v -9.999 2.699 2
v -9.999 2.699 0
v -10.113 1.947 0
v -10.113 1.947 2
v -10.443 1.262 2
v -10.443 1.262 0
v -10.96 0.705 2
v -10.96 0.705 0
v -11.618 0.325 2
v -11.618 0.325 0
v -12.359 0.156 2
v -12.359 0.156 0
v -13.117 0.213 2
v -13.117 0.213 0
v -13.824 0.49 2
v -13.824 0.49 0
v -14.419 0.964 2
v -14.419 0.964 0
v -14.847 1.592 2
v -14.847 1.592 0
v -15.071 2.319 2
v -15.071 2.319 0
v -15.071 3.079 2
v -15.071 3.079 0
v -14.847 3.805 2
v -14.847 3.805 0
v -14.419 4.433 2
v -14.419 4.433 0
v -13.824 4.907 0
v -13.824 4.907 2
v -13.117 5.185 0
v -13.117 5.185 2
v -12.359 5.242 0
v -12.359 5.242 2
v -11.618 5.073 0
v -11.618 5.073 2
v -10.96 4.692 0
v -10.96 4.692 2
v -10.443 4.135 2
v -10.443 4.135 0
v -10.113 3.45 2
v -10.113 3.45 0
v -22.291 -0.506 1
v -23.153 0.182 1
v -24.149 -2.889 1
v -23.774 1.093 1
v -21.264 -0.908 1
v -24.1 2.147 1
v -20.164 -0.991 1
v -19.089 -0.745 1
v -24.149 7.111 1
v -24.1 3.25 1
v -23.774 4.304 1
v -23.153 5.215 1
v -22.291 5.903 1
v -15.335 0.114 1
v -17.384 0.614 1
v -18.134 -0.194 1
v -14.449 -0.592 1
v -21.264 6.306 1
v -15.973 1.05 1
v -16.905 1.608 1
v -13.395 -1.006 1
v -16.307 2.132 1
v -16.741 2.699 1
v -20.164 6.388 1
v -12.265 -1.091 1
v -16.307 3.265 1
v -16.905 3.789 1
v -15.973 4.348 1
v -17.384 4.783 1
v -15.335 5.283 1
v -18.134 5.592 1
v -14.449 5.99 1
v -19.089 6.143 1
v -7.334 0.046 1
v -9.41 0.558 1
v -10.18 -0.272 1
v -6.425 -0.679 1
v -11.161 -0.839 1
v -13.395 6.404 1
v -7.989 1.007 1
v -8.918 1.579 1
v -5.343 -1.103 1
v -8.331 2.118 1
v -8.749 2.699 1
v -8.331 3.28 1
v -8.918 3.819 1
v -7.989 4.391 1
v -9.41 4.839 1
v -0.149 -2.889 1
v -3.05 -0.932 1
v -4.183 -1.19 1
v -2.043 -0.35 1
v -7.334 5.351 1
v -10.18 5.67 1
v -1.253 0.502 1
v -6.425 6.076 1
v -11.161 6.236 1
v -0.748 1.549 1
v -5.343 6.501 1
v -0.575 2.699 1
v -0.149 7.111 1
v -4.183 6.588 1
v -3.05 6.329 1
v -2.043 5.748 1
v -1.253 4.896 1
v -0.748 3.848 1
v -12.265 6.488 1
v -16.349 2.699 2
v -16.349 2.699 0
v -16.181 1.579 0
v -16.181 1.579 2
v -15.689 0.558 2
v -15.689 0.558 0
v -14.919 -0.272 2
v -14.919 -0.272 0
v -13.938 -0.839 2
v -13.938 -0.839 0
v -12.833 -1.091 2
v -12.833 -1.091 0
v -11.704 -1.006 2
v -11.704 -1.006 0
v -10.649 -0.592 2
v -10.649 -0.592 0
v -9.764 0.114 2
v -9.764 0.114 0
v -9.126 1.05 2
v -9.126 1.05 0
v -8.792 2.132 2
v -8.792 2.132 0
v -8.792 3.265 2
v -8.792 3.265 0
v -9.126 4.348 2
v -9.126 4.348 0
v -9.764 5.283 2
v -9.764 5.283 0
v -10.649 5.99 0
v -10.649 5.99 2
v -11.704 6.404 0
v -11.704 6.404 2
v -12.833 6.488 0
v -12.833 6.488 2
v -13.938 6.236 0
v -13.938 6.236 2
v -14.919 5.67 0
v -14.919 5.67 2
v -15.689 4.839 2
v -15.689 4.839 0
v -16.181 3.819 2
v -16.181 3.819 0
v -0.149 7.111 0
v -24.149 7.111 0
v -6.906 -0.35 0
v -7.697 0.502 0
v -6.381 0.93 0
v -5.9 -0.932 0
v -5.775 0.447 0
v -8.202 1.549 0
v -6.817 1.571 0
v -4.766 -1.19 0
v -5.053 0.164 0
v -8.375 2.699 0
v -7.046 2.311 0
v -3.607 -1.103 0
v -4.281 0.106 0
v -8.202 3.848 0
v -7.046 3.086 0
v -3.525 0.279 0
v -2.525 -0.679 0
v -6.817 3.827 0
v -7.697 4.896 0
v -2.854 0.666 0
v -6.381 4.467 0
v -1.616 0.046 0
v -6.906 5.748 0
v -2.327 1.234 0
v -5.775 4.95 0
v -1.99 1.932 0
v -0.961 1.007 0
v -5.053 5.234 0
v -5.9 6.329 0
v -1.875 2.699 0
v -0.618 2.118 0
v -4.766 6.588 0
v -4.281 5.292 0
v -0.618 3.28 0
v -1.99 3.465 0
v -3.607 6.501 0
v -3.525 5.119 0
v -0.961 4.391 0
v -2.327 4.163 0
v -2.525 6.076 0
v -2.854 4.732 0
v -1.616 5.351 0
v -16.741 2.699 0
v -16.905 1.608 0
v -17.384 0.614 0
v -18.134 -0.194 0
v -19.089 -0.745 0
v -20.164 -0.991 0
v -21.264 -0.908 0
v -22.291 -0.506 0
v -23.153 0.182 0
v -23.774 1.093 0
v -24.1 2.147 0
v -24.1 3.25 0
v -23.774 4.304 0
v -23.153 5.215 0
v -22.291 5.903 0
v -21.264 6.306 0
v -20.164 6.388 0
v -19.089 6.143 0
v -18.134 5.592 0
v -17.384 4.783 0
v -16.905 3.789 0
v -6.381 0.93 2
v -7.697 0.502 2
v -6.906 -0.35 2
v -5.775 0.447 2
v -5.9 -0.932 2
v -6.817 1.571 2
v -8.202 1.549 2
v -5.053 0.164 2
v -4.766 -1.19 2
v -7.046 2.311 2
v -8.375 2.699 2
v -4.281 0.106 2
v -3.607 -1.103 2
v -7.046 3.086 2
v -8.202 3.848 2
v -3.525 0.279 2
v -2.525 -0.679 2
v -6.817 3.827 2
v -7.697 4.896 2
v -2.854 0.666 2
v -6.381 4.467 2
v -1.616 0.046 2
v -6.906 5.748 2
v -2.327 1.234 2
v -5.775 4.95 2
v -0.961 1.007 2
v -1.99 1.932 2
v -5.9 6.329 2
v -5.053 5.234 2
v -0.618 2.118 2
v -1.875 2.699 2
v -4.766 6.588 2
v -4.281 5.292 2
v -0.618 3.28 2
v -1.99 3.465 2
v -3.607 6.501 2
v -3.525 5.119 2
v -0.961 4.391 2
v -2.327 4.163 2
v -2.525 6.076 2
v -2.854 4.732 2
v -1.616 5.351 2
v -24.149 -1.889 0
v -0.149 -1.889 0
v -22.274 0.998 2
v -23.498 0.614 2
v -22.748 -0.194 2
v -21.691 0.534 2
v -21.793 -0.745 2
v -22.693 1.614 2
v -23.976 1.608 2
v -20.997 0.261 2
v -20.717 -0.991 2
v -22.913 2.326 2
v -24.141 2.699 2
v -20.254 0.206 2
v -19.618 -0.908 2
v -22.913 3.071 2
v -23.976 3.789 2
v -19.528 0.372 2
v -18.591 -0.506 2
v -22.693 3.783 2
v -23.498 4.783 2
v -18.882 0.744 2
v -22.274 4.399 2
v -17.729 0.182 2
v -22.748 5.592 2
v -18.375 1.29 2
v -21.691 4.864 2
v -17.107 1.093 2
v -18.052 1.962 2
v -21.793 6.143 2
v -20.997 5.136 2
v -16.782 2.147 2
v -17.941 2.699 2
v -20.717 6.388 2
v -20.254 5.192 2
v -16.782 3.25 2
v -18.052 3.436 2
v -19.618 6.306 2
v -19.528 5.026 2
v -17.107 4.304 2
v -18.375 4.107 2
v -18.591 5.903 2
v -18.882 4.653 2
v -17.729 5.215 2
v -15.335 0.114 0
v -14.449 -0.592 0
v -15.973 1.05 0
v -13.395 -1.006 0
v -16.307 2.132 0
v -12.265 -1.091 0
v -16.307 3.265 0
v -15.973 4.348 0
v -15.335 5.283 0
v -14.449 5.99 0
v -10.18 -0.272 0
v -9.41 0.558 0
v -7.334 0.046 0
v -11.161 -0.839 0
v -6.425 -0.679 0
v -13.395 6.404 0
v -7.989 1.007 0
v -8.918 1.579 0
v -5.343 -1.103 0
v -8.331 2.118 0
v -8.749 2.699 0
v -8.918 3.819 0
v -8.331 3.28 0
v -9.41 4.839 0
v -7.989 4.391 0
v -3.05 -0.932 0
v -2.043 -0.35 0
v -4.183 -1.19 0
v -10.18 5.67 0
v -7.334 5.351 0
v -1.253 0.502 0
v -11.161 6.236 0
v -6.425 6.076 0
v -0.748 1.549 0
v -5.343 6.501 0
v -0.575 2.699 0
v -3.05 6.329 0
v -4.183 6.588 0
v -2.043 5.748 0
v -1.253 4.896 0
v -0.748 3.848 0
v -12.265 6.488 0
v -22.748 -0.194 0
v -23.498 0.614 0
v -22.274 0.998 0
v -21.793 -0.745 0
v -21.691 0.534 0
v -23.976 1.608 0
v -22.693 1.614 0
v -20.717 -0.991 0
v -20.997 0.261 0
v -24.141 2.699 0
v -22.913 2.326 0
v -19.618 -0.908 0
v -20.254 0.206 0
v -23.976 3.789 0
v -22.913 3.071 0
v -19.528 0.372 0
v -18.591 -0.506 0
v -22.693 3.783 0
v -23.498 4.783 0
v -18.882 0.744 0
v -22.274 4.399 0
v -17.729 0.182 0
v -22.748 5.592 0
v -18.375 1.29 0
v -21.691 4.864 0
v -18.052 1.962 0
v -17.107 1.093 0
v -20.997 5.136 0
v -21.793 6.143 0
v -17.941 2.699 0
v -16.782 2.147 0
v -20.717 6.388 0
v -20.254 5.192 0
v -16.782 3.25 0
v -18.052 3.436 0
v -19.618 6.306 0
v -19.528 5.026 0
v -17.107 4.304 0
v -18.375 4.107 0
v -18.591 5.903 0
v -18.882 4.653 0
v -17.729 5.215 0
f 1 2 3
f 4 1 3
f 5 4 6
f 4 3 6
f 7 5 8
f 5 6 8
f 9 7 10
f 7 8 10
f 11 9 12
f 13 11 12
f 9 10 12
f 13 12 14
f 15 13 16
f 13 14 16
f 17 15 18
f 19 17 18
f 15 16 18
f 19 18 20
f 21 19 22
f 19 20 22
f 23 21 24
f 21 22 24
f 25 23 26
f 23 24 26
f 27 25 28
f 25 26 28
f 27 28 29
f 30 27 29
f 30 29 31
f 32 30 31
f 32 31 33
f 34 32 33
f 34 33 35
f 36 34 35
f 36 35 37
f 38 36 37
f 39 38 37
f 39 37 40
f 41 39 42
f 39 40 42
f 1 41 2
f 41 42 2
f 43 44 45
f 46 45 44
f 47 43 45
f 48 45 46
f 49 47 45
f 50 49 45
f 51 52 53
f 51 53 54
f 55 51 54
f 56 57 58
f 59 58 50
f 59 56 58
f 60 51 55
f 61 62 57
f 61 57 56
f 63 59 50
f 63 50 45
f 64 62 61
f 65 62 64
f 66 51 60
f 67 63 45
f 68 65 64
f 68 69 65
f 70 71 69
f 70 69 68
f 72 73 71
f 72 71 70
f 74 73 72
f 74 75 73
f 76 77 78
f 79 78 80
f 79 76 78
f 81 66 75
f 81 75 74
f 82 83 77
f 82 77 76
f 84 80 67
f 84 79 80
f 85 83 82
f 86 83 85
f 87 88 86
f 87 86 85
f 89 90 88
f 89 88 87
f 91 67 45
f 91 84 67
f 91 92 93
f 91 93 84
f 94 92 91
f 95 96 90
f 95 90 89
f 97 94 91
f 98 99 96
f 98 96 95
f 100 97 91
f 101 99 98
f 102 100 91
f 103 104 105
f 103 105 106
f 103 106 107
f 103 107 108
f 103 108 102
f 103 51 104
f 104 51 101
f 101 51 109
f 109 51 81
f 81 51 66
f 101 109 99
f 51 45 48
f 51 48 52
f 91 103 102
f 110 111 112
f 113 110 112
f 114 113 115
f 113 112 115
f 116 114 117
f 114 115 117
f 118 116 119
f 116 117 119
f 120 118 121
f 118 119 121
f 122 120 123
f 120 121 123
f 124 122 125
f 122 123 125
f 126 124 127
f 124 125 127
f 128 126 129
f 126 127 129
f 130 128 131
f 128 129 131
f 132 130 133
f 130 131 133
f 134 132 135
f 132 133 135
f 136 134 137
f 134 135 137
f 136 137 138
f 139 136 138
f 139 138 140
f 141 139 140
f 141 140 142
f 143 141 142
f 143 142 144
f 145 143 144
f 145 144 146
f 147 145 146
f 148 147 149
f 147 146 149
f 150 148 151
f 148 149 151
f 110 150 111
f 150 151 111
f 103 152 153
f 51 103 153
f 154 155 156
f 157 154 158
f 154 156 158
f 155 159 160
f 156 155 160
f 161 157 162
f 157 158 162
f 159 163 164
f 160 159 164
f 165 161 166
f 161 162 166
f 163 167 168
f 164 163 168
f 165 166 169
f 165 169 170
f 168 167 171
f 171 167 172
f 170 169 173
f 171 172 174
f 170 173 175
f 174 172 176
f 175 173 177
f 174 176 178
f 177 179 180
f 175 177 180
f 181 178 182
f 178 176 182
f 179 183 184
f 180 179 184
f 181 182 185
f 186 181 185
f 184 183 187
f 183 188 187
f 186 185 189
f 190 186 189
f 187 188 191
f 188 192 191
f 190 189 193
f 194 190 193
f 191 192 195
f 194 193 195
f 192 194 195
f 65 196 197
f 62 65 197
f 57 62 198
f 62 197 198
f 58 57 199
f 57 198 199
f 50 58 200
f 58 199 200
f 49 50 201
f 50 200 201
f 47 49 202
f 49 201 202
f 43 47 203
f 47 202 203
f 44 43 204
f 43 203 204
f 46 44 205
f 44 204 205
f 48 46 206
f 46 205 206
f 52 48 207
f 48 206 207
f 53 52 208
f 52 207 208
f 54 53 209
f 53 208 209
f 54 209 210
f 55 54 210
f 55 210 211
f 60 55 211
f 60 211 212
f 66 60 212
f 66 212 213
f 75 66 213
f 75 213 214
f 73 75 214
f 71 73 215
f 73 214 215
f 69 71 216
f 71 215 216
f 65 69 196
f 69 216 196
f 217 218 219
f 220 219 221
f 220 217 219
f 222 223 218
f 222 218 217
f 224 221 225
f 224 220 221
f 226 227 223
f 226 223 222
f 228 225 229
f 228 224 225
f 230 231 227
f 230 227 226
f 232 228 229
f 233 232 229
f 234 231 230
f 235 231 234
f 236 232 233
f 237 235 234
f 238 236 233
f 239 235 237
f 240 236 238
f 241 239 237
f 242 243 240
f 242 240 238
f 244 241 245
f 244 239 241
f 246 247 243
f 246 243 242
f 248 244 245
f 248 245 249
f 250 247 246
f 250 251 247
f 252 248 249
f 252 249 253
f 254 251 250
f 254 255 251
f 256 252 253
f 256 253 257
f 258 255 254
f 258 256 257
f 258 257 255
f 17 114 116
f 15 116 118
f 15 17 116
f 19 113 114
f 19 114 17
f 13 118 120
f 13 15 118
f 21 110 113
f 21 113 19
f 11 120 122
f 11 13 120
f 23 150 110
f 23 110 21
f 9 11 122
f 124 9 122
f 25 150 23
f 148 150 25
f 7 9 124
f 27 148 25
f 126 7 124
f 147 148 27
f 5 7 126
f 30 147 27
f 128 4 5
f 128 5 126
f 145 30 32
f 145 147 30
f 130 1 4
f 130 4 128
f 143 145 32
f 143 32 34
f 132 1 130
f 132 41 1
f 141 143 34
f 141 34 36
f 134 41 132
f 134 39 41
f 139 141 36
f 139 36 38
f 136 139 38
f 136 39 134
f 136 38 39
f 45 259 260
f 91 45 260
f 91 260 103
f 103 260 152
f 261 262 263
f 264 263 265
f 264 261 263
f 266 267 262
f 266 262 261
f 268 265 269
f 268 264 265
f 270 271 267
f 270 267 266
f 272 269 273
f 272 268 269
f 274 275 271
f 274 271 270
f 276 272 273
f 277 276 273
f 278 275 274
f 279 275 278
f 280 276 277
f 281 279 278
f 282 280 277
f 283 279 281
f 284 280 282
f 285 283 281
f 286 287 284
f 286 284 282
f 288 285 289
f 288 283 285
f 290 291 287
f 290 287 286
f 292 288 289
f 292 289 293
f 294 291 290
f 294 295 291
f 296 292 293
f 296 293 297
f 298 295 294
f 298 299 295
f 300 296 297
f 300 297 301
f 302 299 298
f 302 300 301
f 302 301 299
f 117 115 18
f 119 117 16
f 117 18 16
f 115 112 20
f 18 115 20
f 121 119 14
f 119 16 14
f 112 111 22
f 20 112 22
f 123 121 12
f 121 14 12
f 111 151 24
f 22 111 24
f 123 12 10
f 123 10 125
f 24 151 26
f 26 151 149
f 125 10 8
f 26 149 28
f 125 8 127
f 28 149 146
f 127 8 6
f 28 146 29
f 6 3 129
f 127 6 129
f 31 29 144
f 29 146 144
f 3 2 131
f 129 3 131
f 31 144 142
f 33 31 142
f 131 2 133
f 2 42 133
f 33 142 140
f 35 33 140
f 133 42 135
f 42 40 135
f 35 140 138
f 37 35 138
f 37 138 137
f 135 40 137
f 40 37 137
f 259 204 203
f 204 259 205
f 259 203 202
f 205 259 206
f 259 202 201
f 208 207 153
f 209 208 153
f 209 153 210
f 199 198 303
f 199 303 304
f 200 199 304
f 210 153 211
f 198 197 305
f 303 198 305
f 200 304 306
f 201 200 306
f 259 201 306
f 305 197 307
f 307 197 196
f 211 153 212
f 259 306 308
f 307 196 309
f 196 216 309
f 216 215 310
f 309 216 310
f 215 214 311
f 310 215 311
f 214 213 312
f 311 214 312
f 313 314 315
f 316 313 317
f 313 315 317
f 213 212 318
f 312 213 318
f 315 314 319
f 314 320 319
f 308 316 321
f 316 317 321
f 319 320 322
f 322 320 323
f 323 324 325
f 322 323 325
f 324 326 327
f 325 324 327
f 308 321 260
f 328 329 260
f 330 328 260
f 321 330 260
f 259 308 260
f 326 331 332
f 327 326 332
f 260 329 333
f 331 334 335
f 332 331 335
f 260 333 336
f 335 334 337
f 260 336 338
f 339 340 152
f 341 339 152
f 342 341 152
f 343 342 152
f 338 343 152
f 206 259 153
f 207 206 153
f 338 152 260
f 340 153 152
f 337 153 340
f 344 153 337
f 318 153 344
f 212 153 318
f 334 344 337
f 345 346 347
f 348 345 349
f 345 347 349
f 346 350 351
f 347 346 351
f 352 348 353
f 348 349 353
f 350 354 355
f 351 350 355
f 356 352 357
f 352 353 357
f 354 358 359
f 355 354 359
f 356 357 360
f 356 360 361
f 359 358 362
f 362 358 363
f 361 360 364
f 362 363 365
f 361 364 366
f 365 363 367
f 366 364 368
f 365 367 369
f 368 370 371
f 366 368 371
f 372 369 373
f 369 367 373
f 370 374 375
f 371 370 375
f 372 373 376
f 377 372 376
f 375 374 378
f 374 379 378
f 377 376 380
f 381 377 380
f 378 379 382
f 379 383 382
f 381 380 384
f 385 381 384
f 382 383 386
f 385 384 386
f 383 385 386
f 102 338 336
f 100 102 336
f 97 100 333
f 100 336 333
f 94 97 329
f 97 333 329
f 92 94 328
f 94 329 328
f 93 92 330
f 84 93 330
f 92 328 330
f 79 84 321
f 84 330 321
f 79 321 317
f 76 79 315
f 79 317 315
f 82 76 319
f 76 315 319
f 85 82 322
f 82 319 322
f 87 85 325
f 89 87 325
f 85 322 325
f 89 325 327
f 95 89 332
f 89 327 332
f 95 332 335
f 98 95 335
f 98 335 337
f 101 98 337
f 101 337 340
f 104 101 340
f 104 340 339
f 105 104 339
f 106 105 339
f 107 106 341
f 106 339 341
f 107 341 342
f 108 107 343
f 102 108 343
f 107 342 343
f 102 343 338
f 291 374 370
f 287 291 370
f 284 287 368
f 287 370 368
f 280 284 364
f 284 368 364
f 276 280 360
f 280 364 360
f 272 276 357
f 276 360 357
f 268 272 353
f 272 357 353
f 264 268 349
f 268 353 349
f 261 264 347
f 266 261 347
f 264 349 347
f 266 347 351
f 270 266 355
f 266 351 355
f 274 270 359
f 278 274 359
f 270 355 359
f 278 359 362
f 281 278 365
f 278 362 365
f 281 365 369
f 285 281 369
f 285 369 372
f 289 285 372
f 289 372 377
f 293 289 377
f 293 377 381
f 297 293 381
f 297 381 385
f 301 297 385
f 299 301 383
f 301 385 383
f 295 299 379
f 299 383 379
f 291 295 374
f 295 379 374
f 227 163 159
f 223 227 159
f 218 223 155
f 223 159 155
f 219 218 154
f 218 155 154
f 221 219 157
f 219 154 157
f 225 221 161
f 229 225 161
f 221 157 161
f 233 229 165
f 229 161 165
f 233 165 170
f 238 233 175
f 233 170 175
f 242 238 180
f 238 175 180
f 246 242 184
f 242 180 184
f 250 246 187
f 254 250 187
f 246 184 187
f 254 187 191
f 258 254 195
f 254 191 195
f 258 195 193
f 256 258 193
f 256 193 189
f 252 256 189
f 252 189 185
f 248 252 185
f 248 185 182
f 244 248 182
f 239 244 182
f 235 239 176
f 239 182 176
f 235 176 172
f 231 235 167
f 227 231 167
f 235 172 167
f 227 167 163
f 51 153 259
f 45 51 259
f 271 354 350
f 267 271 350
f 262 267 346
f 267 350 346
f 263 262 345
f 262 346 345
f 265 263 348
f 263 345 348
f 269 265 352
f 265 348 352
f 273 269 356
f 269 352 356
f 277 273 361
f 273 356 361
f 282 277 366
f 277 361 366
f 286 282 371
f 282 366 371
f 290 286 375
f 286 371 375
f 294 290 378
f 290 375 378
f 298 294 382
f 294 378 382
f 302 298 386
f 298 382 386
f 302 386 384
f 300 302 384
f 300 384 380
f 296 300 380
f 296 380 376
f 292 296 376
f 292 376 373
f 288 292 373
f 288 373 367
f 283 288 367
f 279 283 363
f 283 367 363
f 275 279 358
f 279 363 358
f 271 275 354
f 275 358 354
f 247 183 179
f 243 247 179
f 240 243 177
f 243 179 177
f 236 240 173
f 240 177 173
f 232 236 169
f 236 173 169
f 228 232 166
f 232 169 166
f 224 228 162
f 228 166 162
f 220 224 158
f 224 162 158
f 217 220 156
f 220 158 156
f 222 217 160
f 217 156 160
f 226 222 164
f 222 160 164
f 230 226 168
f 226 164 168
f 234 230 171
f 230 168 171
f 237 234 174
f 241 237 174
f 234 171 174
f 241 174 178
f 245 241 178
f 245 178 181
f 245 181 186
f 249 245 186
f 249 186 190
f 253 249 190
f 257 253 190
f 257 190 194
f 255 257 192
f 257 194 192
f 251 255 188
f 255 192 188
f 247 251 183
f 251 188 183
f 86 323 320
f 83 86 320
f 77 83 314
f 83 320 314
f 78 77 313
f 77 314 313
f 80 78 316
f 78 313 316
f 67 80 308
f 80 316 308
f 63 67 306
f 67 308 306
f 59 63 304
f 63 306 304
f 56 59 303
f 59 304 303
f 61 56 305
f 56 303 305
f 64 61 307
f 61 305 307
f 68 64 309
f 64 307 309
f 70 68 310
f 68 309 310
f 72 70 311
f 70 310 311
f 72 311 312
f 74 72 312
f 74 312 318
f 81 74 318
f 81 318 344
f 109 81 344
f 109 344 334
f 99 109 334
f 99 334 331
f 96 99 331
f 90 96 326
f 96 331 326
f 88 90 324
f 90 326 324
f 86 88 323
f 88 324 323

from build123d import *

# Parameters (mm, degrees)
F1_DEPTH = 2
F2_DEPTH = 1
F3_SIZE  = 0.99999


# Not quite as in the source:
# - a fillet or chamfer is up to 0.001 mm smaller than in the source, because OpenCascade refuses the exact size


with BuildPart() as f1:
    # F0 (on Top) → F1 (new body)
    with BuildSketch(Plane.XY):
        with BuildLine():
            ThreePointArc((-16.7408706831, 2.6987831955), (-20.4408706831, 6.3987831955), (-24.1408706831, 2.6987831955))
            Line((-24.1408706831, 2.6987831955), (-22.9408706831, 2.6987831955))
            ThreePointArc((-22.9408706831, 2.6987831955), (-20.4408706831, 5.1987831955), (-17.9408706831, 2.6987831955))
            Line((-17.9408706831, 2.6987831955), (-16.7408706831, 2.6987831955))
        make_face()
        with BuildLine():
            Line((-22.9408706831, 2.6987831955), (-24.1408706831, 2.6987831955))
            ThreePointArc((-24.1408706831, 2.6987831955), (-20.4408706831, -1.0012168045), (-16.7408706831, 2.6987831955))
            Line((-16.7408706831, 2.6987831955), (-17.9408706831, 2.6987831955))
            ThreePointArc((-17.9408706831, 2.6987831955), (-20.4408706831, 0.1987831955), (-22.9408706831, 2.6987831955))
        make_face()
    extrude(amount=F1_DEPTH)


with BuildPart() as f1b:
    # F0 (on Top) → F1, piece 2 (new body)
    with BuildSketch(Plane.XY):
        with BuildLine():
            ThreePointArc((-8.7494403885, 2.6987831955), (-12.5494403885, 6.4987831955), (-16.3494403885, 2.6987831955))
            Line((-16.3494403885, 2.6987831955), (-15.0994403885, 2.6987831955))
            ThreePointArc((-15.0994403885, 2.6987831955), (-12.5494403885, 5.2487831955), (-9.9994403885, 2.6987831955))
            Line((-9.9994403885, 2.6987831955), (-8.7494403885, 2.6987831955))
        make_face()
        with BuildLine():
            Line((-15.0994403885, 2.6987831955), (-16.3494403885, 2.6987831955))
            ThreePointArc((-16.3494403885, 2.6987831955), (-12.5494403885, -1.1012168045), (-8.7494403885, 2.6987831955))
            Line((-8.7494403885, 2.6987831955), (-9.9994403885, 2.6987831955))
            ThreePointArc((-9.9994403885, 2.6987831955), (-12.5494403885, 0.1487831955), (-15.0994403885, 2.6987831955))
        make_face()
    extrude(amount=F1_DEPTH)


with BuildPart() as f1c:
    # F0 (on Top) → F1, piece 3 (new body)
    with BuildSketch(Plane.XY):
        with BuildLine():
            Line((-1.874870298, 2.6987831955), (-0.574870298, 2.6987831955))
            ThreePointArc((-0.574870298, 2.6987831955), (-4.474870298, 6.5987831955), (-8.374870298, 2.6987831955))
            Line((-8.374870298, 2.6987831955), (-7.074870298, 2.6987831955))
            ThreePointArc((-7.074870298, 2.6987831955), (-4.474870298, 5.2987831955), (-1.874870298, 2.6987831955))
        make_face()
        with BuildLine():
            ThreePointArc((-8.374870298, 2.6987831955), (-4.474870298, -1.2012168045), (-0.574870298, 2.6987831955))
            Line((-0.574870298, 2.6987831955), (-1.874870298, 2.6987831955))
            ThreePointArc((-1.874870298, 2.6987831955), (-4.474870298, 0.0987831955), (-7.074870298, 2.6987831955))
            Line((-7.074870298, 2.6987831955), (-8.374870298, 2.6987831955))
        make_face()
    extrude(amount=F1_DEPTH)


with BuildPart() as f2:
    # F0 (on Top) → F2 (new body)
    with BuildSketch(Plane.XY):
        with BuildLine():
            Line((-0.1485164072, 7.1107540186), (-24.1485164072, 7.1107540186))
            Line((-24.1485164072, 7.1107540186), (-24.1485164072, 2.6987831955))
            Line((-24.1485164072, 2.6987831955), (-24.1408706831, 2.6987831955))
            ThreePointArc((-24.1408706831, 2.6987831955), (-20.4408706831, 6.3987831955), (-16.7408706831, 2.6987831955))
            Line((-16.7408706831, 2.6987831955), (-16.3494403885, 2.6987831955))
            ThreePointArc((-16.3494403885, 2.6987831955), (-12.5494403885, 6.4987831955), (-8.7494403885, 2.6987831955))
            Line((-8.7494403885, 2.6987831955), (-8.374870298, 2.6987831955))
            ThreePointArc((-8.374870298, 2.6987831955), (-4.474870298, 6.5987831955), (-0.574870298, 2.6987831955))
            Line((-0.574870298, 2.6987831955), (-0.1485164072, 2.6987831955))
            Line((-0.1485164072, 2.6987831955), (-0.1485164072, 7.1107540186))
        make_face()
        with BuildLine():
            Line((-24.1408706831, 2.6987831955), (-24.1485164072, 2.6987831955))
            Line((-24.1485164072, 2.6987831955), (-24.1485164072, -2.8892459814))
            Line((-24.1485164072, -2.8892459814), (-0.1485164072, -2.8892459814))
            Line((-0.1485164072, -2.8892459814), (-0.1485164072, 2.6987831955))
            Line((-0.1485164072, 2.6987831955), (-0.574870298, 2.6987831955))
            ThreePointArc((-0.574870298, 2.6987831955), (-4.474870298, -1.2012168045), (-8.374870298, 2.6987831955))
            Line((-8.374870298, 2.6987831955), (-8.7494403885, 2.6987831955))
            ThreePointArc((-8.7494403885, 2.6987831955), (-12.5494403885, -1.1012168045), (-16.3494403885, 2.6987831955))
            Line((-16.3494403885, 2.6987831955), (-16.7408706831, 2.6987831955))
            ThreePointArc((-16.7408706831, 2.6987831955), (-20.4408706831, -1.0012168045), (-24.1408706831, 2.6987831955))
        make_face()
    extrude(amount=F2_DEPTH)

    # F3 (size 1 in the source; OpenCascade refuses exactly that, so slightly less here)
    f3_edges = [f2.edges().sort_by_distance(p)[0] for p in [
        (-12.148516, -2.889246, 0),
    ]]
    chamfer(f3_edges, length=F3_SIZE)


solid = Compound([f1.part, f1b.part, f1c.part, f2.part])
